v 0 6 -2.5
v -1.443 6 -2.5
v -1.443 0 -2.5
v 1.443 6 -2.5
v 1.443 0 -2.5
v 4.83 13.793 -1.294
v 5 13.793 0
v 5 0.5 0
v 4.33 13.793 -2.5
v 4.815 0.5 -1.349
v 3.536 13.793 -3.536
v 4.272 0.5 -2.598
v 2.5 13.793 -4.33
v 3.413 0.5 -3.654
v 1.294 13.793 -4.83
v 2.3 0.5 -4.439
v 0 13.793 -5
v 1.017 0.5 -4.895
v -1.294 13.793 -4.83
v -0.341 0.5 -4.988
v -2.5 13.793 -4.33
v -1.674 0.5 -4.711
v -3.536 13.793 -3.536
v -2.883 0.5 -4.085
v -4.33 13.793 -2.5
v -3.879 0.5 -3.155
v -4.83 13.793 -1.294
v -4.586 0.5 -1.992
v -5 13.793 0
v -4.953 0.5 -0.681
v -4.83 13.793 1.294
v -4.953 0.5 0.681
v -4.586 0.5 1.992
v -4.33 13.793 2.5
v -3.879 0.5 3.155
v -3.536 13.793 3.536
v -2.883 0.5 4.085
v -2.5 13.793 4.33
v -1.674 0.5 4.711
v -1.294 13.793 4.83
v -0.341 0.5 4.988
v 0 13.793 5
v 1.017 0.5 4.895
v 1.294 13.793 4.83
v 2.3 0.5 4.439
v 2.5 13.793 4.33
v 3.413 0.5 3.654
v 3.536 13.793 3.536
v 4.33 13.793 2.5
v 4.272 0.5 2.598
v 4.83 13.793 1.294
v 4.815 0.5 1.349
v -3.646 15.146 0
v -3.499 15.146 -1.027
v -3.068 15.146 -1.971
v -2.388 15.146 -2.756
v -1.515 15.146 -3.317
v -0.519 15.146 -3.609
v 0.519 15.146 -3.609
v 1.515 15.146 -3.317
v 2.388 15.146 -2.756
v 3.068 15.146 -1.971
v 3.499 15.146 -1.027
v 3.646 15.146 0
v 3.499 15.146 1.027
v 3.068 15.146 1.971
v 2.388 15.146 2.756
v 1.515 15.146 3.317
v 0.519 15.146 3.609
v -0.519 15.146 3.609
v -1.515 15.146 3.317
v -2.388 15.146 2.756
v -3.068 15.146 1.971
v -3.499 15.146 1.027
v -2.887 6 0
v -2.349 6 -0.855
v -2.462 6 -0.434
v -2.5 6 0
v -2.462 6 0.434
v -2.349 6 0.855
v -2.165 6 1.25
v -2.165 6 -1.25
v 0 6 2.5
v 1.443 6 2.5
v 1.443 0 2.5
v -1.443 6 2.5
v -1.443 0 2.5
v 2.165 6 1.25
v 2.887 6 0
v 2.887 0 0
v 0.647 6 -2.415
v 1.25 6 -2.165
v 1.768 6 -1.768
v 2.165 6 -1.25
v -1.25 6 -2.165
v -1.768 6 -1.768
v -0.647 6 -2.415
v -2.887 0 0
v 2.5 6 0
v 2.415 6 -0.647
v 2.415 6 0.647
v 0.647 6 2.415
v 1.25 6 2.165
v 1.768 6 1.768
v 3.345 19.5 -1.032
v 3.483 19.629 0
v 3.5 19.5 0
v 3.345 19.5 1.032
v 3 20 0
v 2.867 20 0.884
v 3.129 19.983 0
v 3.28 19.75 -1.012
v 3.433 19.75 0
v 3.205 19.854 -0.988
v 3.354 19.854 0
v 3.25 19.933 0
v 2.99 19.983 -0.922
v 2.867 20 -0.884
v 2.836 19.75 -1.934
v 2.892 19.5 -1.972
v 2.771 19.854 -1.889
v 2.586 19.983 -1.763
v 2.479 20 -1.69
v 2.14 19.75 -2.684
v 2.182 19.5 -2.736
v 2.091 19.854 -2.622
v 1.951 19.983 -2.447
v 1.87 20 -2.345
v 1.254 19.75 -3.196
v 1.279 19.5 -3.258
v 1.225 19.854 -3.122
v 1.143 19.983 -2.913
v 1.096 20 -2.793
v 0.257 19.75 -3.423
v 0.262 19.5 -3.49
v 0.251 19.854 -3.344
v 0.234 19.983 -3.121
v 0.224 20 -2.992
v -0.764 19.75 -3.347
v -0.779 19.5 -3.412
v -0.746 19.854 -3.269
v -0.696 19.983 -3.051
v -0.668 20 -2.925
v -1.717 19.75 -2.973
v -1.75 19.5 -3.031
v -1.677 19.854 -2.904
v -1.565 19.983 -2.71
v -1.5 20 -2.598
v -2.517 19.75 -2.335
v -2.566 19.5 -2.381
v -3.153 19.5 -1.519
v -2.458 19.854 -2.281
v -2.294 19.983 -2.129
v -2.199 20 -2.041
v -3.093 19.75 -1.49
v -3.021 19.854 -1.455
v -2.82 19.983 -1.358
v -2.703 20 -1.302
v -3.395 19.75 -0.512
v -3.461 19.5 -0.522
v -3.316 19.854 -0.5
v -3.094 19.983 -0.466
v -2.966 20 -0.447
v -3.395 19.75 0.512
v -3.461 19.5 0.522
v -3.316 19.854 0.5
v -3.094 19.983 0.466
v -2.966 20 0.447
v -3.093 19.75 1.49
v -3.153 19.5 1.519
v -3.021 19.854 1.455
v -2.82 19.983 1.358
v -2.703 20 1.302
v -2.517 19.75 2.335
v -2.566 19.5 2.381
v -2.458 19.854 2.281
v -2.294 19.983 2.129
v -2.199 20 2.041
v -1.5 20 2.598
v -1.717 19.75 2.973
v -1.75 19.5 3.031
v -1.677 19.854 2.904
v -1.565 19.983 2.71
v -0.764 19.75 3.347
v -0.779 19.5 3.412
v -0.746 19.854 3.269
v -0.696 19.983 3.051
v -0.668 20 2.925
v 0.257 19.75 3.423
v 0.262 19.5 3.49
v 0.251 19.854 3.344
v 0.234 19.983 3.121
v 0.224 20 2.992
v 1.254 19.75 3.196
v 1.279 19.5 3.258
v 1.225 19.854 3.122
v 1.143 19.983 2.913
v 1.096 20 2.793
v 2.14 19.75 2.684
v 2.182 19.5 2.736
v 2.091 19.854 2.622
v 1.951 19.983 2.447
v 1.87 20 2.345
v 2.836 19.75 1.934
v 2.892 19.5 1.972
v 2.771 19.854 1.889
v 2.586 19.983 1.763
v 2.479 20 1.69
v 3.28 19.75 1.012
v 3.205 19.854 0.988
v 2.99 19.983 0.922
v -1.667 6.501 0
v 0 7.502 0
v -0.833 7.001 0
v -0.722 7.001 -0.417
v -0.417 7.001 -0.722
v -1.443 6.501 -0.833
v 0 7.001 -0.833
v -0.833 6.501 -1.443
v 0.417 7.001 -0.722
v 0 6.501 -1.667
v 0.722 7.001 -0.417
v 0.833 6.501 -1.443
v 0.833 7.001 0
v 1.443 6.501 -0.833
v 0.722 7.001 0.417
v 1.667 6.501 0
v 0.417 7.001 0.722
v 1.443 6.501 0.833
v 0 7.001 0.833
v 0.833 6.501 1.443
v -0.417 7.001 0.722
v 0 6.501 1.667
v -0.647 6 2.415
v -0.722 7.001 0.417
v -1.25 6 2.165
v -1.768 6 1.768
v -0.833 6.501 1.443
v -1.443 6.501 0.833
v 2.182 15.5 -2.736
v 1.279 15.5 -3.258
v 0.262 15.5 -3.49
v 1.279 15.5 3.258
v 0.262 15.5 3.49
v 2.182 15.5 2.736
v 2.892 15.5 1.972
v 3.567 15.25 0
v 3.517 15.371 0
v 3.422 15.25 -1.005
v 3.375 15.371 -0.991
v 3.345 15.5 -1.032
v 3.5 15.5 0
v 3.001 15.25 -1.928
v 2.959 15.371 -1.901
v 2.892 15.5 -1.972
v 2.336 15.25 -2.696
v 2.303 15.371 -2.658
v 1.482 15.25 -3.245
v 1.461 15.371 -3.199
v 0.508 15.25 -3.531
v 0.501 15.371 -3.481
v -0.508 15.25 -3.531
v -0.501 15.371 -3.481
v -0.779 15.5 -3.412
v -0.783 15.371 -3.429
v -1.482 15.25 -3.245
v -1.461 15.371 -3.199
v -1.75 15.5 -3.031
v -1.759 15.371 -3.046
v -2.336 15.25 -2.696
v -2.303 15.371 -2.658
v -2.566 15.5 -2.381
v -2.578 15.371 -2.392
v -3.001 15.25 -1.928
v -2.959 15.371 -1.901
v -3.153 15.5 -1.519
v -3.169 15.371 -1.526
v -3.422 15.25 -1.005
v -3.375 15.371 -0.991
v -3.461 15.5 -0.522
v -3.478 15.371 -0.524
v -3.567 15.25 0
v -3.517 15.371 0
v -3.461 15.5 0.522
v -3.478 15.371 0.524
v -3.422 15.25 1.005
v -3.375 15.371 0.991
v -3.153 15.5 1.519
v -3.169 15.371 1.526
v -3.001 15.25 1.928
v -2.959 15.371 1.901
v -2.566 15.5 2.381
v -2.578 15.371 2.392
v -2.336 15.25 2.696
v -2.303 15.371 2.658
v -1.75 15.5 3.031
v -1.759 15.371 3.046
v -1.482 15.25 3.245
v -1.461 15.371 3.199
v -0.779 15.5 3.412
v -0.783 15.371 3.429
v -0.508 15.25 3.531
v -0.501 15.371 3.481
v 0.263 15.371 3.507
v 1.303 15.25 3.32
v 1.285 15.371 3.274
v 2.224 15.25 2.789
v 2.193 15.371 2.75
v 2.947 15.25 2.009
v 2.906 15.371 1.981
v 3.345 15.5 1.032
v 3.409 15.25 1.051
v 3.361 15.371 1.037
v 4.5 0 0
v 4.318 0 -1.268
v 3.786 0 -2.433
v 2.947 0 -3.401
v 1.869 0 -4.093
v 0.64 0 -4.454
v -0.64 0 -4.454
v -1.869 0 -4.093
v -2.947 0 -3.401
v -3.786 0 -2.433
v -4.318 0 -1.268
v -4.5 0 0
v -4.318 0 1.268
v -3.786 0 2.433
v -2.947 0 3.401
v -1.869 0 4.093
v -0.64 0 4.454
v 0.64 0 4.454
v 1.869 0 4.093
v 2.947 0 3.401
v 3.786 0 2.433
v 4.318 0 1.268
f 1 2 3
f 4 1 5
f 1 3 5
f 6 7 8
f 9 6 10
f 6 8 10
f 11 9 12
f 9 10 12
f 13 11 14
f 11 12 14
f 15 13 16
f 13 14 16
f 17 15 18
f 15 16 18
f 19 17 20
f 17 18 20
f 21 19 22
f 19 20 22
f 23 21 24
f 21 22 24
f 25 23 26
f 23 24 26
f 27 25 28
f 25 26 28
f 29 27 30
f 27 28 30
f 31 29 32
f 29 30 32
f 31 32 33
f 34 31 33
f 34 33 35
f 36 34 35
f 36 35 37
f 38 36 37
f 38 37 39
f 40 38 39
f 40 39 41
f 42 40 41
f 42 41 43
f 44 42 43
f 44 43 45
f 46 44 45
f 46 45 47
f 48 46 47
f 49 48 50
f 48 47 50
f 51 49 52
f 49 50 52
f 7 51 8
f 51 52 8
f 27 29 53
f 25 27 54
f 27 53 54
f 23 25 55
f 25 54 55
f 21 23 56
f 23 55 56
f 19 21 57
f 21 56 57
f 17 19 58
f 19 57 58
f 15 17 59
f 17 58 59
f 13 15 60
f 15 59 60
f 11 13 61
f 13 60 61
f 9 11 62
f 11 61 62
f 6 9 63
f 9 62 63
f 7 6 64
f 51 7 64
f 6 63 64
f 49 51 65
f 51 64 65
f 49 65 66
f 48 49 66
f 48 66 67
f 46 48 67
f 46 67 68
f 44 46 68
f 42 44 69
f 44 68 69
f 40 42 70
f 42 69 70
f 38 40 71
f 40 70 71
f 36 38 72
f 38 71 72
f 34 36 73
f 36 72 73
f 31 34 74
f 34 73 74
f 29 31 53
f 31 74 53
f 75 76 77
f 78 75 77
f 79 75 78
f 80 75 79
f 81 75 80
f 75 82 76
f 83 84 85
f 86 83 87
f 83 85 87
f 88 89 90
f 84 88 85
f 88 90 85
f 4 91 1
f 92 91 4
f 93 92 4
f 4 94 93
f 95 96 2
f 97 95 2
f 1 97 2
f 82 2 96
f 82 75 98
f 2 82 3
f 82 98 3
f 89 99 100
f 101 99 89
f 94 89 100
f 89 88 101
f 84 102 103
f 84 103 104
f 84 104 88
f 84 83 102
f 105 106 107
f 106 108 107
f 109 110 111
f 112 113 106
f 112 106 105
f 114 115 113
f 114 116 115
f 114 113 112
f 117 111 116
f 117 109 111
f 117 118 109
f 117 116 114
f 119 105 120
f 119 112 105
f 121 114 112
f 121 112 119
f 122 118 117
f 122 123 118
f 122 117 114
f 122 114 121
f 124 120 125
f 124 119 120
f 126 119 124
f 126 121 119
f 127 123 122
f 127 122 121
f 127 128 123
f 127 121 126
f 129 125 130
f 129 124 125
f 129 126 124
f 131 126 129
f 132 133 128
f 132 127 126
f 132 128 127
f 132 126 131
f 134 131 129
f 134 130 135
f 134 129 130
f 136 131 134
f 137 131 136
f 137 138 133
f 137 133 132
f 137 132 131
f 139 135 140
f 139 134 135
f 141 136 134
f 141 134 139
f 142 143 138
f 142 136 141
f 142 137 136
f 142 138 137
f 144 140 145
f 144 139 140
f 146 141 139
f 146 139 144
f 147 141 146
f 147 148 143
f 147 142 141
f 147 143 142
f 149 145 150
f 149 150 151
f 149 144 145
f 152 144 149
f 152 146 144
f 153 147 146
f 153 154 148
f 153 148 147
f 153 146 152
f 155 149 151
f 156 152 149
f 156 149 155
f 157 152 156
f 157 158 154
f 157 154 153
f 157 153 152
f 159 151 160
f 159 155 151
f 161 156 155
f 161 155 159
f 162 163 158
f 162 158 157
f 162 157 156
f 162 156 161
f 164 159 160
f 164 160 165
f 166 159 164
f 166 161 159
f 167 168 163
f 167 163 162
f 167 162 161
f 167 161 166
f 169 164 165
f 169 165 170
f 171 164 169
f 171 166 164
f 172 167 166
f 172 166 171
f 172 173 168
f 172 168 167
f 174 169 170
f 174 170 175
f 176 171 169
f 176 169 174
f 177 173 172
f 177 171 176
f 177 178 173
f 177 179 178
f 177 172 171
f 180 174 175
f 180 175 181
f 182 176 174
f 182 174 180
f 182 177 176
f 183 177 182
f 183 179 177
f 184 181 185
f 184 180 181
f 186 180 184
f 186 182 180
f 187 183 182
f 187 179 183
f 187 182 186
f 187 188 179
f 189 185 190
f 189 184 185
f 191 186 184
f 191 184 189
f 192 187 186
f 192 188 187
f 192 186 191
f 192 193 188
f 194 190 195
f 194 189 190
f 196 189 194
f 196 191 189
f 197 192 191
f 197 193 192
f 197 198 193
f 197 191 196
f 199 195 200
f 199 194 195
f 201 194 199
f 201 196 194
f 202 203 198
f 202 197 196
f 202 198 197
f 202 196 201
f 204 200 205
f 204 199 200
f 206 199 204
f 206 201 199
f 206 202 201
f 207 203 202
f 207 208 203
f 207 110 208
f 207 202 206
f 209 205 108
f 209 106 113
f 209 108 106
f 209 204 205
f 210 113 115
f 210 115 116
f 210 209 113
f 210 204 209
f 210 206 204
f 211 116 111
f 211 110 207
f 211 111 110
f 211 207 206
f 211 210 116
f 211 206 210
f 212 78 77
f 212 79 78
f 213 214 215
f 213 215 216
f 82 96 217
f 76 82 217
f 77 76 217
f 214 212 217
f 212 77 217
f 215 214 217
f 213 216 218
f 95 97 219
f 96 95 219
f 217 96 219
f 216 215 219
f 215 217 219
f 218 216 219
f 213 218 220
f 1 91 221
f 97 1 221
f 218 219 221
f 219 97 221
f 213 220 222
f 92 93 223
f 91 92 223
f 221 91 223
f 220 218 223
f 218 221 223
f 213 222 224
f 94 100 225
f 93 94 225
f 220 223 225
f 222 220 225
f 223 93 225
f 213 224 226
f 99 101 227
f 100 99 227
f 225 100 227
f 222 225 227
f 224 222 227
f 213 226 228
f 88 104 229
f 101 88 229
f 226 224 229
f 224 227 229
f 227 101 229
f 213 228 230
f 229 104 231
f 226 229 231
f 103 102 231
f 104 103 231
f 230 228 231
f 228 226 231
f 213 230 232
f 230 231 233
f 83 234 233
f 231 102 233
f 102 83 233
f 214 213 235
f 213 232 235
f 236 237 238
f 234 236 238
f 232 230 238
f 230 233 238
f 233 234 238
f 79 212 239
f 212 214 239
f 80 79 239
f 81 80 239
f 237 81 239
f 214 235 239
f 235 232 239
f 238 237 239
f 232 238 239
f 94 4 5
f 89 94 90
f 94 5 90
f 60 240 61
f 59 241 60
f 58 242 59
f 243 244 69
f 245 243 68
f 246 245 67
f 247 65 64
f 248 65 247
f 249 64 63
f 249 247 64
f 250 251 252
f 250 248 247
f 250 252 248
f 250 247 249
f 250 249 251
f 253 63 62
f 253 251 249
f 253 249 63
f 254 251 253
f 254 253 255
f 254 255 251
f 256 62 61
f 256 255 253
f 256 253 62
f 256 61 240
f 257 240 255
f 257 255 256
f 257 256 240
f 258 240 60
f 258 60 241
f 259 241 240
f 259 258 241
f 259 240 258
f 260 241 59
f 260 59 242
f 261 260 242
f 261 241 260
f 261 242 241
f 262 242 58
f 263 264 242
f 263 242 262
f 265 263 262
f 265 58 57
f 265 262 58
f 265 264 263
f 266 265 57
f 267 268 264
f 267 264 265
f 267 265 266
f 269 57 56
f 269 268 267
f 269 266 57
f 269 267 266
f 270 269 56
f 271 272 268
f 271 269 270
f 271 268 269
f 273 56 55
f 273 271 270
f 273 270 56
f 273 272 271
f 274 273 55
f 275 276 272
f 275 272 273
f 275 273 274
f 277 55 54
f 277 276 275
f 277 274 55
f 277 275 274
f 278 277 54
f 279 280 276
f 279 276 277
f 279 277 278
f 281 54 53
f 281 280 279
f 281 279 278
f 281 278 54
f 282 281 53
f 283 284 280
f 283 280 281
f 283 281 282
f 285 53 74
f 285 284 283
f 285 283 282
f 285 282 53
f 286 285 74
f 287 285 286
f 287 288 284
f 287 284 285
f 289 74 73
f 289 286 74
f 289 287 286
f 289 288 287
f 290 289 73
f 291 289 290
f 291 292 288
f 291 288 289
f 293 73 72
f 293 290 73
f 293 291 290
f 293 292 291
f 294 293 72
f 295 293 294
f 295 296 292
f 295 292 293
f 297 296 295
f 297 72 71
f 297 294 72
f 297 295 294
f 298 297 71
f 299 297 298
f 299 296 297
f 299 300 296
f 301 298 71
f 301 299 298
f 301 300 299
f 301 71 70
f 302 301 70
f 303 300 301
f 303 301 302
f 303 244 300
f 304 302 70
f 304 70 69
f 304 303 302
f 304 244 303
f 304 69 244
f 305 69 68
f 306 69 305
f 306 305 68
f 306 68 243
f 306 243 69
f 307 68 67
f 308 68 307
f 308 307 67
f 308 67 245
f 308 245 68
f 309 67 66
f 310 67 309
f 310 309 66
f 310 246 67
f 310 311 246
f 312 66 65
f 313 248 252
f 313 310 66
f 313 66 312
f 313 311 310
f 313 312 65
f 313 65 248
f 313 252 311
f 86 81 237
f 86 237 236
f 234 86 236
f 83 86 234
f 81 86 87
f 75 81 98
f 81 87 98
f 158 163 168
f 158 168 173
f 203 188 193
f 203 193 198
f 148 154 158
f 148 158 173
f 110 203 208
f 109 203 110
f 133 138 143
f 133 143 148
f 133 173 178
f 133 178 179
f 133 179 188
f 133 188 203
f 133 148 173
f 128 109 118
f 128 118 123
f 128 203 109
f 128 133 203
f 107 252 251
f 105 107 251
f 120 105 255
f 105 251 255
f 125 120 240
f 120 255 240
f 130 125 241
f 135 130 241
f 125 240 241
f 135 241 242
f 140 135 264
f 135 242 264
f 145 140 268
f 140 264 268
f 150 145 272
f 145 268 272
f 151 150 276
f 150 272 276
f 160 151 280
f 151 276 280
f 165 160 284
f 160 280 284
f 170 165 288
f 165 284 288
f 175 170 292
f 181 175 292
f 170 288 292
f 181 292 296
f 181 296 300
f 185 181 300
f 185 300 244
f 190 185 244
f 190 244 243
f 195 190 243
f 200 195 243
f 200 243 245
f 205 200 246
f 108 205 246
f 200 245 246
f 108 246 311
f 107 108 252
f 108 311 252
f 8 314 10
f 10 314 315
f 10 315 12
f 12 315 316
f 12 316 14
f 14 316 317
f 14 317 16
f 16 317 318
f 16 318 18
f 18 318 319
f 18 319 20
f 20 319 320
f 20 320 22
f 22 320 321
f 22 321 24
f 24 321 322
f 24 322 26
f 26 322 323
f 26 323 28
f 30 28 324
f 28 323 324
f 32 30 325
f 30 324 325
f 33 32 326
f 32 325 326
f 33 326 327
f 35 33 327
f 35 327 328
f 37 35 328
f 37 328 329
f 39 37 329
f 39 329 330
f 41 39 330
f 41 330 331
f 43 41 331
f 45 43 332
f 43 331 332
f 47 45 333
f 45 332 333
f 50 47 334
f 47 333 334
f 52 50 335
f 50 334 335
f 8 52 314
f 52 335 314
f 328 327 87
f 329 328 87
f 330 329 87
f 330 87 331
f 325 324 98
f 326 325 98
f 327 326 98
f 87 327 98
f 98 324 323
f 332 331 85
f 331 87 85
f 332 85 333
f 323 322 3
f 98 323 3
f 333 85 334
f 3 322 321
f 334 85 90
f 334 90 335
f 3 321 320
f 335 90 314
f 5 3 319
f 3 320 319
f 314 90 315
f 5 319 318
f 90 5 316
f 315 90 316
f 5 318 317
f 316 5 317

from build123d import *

# Parameters (mm, degrees)
SKETCH1_R                 = 5
BOSS_EXTRUDE1_DEPTH       = 15
SKETCH2_R                 = 3.5
BOSS_EXTRUDE2_DEPTH       = 5
FILLET1_R                 = 0.5
F_5_0MM_DOWEL_HOLE2_D     = 5
F_5_0MM_DOWEL_HOLE2_DEPTH = 6
F_5_0MM_DOWEL_HOLE2_TIP   = 1.502151548
CUT_EXTRUDE1_DEPTH        = 6
CHAMFER1_SIZE             = 0.5


with BuildPart() as part:
    # Sketch1 → Boss-Extrude1 (new body)
    with BuildSketch(Plane(origin=(0, 0, 0), x_dir=(1, 0, 0), z_dir=(0, 1, 0))):
        Circle(SKETCH1_R)
    extrude(amount=BOSS_EXTRUDE1_DEPTH)

    # Sketch2 → Boss-Extrude2 (add)
    with BuildSketch(Plane(origin=(0, 15, 0), x_dir=(1, 0, 0), z_dir=(0, 1, 0))):
        Circle(SKETCH2_R)
    extrude(amount=BOSS_EXTRUDE2_DEPTH)

    # Fillet1
    fillet1_edges = [part.edges().sort_by_distance(p)[0] for p in [
        (-3.5, 15, 0),
        (-3.5, 20, 0),
    ]]
    fillet(fillet1_edges, radius=FILLET1_R)

    # Sketch3 → Cut-Revolve1 (revolve, cut)
    with BuildSketch(Plane.XY):
        Polygon((-5, 13.792893219), (-3.646446609, 15.146446609), (-5, 15), align=None)
    revolve(axis=Axis((0, 20, 0), (0, -1, 0)), mode=Mode.SUBTRACT)

    # Ø5.0mm Dowel Hole2
    with Locations(Plane(origin=(0, 0, 0), x_dir=(-1, 0, 0), z_dir=(0, -1, 0))):
        with Locations((0, 0)):
            Hole(F_5_0MM_DOWEL_HOLE2_D / 2, depth=F_5_0MM_DOWEL_HOLE2_DEPTH)
            with Locations((0, 0, -(F_5_0MM_DOWEL_HOLE2_DEPTH + F_5_0MM_DOWEL_HOLE2_TIP / 2))):  # 118° drill point
                Cone(0, F_5_0MM_DOWEL_HOLE2_D / 2, F_5_0MM_DOWEL_HOLE2_TIP, mode=Mode.SUBTRACT)

    # Sketch4 → Cut-Extrude1 (cut)
    with BuildSketch(Plane.XZ):
        Polygon((2.886751346, 0), (1.443375673, 2.5), (-1.443375673, 2.5), (-2.886751346, 0), (-1.443375673, -2.5), (1.443375673, -2.5), align=None)
    extrude(amount=-CUT_EXTRUDE1_DEPTH, mode=Mode.SUBTRACT)

    # Chamfer1
    chamfer1_edges = [part.edges().sort_by_distance(p)[0] for p in [
        (-5, 0, 0),
    ]]
    chamfer(chamfer1_edges, length=CHAMFER1_SIZE)


solid = part.part
